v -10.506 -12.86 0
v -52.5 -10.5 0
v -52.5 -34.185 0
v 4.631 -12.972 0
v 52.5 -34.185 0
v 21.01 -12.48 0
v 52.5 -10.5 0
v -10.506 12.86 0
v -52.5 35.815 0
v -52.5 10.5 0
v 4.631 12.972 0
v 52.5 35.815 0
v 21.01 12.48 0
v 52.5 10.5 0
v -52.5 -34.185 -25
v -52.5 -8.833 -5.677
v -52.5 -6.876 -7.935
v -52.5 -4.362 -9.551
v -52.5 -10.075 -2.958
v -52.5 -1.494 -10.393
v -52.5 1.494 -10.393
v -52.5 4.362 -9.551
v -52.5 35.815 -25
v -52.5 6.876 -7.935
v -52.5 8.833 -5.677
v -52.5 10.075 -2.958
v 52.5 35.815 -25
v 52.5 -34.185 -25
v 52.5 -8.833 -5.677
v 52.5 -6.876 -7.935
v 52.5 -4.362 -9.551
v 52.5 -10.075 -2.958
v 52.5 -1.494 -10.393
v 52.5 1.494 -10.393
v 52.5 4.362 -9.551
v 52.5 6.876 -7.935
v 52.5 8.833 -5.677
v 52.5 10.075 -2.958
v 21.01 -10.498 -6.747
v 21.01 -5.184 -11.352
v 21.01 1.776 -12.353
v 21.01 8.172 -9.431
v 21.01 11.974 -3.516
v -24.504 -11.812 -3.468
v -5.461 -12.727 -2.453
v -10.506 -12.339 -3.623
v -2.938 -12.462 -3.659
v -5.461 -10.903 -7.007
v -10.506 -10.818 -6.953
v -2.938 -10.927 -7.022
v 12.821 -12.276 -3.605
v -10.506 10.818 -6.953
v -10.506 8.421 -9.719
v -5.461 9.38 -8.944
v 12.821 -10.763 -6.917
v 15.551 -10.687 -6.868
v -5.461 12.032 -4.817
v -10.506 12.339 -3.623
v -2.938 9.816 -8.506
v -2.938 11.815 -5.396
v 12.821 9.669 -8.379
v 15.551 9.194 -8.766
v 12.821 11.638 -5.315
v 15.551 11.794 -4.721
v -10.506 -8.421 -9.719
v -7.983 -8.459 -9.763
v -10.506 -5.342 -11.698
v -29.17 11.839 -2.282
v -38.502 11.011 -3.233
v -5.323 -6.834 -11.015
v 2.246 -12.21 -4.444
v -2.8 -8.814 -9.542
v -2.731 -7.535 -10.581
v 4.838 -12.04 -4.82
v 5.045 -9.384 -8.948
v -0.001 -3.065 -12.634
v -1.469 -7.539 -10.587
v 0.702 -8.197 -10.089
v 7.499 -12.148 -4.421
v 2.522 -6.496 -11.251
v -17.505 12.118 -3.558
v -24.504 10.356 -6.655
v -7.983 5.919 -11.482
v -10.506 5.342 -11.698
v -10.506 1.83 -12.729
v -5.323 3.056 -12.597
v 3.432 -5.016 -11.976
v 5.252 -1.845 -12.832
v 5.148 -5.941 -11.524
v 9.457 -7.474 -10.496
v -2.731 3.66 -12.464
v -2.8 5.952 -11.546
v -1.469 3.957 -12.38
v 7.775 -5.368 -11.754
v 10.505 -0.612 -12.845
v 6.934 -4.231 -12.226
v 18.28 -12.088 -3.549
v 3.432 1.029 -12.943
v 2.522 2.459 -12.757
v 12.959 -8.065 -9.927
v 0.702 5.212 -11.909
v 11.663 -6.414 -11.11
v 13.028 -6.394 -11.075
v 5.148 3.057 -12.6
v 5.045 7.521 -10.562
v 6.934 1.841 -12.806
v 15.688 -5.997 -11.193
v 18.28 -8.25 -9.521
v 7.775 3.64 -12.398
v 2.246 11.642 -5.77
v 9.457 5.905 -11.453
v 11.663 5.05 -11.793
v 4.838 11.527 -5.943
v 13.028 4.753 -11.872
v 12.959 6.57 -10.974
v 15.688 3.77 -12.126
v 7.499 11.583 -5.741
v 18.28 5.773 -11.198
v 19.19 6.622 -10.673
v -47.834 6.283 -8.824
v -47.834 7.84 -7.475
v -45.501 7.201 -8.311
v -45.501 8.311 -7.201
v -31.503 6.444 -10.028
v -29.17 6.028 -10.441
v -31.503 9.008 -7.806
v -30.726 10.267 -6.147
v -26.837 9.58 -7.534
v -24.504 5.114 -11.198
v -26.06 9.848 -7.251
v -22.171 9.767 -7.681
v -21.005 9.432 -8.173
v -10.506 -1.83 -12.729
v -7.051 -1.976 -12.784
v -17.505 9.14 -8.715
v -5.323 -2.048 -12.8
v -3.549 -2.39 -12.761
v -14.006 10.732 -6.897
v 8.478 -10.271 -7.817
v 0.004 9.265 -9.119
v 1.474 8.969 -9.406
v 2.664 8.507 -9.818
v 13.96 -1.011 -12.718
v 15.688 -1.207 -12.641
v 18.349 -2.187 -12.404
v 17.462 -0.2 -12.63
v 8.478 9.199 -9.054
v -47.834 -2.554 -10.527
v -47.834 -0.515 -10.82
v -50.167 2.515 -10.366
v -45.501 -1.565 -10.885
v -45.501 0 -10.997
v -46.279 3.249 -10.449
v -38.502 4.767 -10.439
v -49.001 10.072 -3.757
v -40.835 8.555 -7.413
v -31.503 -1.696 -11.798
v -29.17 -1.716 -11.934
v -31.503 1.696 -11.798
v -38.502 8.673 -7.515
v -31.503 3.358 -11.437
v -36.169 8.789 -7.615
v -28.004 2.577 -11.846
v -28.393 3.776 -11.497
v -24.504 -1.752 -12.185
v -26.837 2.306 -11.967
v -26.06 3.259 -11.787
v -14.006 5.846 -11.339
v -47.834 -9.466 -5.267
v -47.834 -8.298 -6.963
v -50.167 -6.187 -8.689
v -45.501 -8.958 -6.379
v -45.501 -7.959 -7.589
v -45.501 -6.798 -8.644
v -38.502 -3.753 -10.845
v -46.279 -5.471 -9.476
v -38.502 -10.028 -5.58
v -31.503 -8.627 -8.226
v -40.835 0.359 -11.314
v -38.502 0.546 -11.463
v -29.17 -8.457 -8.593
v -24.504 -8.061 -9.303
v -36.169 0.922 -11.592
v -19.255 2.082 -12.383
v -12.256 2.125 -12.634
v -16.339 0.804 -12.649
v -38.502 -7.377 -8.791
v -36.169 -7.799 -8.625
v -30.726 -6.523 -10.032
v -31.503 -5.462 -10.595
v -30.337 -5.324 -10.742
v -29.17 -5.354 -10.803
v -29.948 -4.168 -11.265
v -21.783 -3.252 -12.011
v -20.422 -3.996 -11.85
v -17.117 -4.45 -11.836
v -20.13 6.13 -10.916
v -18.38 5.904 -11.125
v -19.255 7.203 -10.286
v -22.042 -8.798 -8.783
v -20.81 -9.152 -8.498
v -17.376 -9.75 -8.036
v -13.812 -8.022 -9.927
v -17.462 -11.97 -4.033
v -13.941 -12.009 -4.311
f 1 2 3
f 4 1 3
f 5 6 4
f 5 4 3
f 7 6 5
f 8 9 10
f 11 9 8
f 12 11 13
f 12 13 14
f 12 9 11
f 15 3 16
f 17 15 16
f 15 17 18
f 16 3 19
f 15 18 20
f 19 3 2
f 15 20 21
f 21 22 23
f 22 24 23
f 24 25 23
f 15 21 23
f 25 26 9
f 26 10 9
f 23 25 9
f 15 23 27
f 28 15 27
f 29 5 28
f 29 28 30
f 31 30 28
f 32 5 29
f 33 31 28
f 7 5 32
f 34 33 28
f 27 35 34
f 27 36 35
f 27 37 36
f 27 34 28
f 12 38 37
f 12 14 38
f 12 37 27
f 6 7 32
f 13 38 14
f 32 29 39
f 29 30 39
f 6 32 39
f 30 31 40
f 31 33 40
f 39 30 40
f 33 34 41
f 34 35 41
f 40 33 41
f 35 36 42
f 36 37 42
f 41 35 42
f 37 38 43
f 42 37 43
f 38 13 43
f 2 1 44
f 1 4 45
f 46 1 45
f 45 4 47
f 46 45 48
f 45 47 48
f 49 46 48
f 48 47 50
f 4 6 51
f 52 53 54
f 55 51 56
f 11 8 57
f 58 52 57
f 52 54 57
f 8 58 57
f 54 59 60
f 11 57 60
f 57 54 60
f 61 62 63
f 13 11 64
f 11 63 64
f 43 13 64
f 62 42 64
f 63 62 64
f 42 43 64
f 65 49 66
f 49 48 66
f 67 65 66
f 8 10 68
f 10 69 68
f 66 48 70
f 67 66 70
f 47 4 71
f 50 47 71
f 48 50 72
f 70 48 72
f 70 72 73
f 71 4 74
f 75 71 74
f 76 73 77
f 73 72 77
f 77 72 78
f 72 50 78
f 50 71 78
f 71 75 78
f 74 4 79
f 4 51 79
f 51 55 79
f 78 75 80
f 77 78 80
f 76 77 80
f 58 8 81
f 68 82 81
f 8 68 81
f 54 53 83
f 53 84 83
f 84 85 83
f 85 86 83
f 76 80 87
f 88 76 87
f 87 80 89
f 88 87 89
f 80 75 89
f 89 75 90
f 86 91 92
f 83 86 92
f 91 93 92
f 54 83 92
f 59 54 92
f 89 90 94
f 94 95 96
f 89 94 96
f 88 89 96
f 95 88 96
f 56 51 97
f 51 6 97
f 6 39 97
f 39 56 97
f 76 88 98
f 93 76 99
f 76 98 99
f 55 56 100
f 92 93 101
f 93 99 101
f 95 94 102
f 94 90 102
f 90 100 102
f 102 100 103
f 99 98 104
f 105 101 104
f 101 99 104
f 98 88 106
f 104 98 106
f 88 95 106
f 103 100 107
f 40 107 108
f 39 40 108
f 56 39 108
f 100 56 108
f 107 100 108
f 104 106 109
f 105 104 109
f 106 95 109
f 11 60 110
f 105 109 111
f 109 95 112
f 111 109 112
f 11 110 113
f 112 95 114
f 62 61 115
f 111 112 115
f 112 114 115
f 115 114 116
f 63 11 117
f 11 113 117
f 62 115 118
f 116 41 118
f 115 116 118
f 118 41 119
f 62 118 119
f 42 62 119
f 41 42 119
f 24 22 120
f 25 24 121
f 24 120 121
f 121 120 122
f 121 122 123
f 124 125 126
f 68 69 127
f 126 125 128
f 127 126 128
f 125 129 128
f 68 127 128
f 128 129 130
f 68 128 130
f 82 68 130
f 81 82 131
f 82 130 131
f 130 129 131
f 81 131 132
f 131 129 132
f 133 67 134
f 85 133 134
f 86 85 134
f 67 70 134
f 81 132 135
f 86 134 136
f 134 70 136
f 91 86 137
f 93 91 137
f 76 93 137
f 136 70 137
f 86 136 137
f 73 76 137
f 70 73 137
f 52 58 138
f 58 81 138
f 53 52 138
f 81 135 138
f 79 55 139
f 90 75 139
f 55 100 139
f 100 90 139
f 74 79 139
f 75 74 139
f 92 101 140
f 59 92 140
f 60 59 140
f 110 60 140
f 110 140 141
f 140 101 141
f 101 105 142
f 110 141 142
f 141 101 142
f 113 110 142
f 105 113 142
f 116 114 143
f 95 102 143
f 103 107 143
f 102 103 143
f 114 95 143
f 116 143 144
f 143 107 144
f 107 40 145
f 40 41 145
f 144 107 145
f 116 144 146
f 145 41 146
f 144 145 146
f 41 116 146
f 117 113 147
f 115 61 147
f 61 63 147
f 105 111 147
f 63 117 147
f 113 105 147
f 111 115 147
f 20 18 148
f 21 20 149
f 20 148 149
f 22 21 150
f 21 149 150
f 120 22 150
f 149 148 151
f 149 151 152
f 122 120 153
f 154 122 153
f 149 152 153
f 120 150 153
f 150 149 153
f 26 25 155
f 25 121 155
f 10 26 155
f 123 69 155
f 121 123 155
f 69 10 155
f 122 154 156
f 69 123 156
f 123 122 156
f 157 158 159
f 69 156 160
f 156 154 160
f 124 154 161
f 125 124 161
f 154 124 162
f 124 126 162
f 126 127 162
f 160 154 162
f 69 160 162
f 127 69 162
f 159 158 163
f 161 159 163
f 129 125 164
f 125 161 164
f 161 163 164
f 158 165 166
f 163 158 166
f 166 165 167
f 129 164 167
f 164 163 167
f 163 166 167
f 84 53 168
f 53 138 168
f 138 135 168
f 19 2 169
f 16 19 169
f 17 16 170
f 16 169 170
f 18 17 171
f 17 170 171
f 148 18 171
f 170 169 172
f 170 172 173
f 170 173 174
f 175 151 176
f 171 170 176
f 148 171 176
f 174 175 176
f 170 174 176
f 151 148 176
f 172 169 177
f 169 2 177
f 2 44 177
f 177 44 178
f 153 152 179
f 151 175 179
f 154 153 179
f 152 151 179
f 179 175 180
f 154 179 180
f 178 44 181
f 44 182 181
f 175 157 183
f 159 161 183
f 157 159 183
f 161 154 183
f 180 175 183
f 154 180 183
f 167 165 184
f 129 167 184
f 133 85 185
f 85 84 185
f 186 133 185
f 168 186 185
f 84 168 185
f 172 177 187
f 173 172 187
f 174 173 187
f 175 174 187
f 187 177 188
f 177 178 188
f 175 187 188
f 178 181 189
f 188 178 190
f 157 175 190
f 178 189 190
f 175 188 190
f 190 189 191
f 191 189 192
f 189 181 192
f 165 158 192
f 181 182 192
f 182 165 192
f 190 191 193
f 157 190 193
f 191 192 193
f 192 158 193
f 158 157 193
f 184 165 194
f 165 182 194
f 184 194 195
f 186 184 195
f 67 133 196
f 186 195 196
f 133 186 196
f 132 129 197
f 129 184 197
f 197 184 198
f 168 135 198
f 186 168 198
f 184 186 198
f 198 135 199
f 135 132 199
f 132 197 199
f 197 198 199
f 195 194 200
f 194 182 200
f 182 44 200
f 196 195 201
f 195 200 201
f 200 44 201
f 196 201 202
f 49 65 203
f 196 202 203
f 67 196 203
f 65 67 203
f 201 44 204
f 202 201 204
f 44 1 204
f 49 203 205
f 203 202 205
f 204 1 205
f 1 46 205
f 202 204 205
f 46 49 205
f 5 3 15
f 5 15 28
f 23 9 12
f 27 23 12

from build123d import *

# Parameters (mm, degrees)
F1_W     = 105
F1_H     = 70
F2_DEPTH = 25
F4_ANGLE = -180


with BuildPart() as f2:
    # F1 (on Top) → F2 (new body)
    with BuildSketch(Plane.XY):
        with Locations((0, 0.815216)):
            Rectangle(F1_W, F1_H)
    extrude(amount=-F2_DEPTH)

    # F0 (on Front) → F3 (revolve, cut)
    with BuildSketch(Plane.XZ):
        with BuildLine():
            Line((-52.5, 10.5), (-52.5, 0))
            Line((-52.5, 0), (52.5, 0))
            Line((52.5, 0), (52.5, 10.5))
            add(Edge.make_bspline(
                [(-52.5, 10.5), (-35, 11.75), (0, 14.25), (35, 11.75), (52.5, 10.5)],
                knots=[0, 0, 0, 0, 52.55949, 105.11898, 105.11898, 105.11898, 105.11898], degree=3))
        make_face()
    revolve(axis=Axis((4.963639, 0, 0), (1, 0, 0)), mode=Mode.SUBTRACT)


with BuildPart() as f4_1:
    # F4: copy of F2
    add(f2.part.rotate(Axis((52.5, 0, 0), (1, 0, 0)), F4_ANGLE))


solid = f2.part
